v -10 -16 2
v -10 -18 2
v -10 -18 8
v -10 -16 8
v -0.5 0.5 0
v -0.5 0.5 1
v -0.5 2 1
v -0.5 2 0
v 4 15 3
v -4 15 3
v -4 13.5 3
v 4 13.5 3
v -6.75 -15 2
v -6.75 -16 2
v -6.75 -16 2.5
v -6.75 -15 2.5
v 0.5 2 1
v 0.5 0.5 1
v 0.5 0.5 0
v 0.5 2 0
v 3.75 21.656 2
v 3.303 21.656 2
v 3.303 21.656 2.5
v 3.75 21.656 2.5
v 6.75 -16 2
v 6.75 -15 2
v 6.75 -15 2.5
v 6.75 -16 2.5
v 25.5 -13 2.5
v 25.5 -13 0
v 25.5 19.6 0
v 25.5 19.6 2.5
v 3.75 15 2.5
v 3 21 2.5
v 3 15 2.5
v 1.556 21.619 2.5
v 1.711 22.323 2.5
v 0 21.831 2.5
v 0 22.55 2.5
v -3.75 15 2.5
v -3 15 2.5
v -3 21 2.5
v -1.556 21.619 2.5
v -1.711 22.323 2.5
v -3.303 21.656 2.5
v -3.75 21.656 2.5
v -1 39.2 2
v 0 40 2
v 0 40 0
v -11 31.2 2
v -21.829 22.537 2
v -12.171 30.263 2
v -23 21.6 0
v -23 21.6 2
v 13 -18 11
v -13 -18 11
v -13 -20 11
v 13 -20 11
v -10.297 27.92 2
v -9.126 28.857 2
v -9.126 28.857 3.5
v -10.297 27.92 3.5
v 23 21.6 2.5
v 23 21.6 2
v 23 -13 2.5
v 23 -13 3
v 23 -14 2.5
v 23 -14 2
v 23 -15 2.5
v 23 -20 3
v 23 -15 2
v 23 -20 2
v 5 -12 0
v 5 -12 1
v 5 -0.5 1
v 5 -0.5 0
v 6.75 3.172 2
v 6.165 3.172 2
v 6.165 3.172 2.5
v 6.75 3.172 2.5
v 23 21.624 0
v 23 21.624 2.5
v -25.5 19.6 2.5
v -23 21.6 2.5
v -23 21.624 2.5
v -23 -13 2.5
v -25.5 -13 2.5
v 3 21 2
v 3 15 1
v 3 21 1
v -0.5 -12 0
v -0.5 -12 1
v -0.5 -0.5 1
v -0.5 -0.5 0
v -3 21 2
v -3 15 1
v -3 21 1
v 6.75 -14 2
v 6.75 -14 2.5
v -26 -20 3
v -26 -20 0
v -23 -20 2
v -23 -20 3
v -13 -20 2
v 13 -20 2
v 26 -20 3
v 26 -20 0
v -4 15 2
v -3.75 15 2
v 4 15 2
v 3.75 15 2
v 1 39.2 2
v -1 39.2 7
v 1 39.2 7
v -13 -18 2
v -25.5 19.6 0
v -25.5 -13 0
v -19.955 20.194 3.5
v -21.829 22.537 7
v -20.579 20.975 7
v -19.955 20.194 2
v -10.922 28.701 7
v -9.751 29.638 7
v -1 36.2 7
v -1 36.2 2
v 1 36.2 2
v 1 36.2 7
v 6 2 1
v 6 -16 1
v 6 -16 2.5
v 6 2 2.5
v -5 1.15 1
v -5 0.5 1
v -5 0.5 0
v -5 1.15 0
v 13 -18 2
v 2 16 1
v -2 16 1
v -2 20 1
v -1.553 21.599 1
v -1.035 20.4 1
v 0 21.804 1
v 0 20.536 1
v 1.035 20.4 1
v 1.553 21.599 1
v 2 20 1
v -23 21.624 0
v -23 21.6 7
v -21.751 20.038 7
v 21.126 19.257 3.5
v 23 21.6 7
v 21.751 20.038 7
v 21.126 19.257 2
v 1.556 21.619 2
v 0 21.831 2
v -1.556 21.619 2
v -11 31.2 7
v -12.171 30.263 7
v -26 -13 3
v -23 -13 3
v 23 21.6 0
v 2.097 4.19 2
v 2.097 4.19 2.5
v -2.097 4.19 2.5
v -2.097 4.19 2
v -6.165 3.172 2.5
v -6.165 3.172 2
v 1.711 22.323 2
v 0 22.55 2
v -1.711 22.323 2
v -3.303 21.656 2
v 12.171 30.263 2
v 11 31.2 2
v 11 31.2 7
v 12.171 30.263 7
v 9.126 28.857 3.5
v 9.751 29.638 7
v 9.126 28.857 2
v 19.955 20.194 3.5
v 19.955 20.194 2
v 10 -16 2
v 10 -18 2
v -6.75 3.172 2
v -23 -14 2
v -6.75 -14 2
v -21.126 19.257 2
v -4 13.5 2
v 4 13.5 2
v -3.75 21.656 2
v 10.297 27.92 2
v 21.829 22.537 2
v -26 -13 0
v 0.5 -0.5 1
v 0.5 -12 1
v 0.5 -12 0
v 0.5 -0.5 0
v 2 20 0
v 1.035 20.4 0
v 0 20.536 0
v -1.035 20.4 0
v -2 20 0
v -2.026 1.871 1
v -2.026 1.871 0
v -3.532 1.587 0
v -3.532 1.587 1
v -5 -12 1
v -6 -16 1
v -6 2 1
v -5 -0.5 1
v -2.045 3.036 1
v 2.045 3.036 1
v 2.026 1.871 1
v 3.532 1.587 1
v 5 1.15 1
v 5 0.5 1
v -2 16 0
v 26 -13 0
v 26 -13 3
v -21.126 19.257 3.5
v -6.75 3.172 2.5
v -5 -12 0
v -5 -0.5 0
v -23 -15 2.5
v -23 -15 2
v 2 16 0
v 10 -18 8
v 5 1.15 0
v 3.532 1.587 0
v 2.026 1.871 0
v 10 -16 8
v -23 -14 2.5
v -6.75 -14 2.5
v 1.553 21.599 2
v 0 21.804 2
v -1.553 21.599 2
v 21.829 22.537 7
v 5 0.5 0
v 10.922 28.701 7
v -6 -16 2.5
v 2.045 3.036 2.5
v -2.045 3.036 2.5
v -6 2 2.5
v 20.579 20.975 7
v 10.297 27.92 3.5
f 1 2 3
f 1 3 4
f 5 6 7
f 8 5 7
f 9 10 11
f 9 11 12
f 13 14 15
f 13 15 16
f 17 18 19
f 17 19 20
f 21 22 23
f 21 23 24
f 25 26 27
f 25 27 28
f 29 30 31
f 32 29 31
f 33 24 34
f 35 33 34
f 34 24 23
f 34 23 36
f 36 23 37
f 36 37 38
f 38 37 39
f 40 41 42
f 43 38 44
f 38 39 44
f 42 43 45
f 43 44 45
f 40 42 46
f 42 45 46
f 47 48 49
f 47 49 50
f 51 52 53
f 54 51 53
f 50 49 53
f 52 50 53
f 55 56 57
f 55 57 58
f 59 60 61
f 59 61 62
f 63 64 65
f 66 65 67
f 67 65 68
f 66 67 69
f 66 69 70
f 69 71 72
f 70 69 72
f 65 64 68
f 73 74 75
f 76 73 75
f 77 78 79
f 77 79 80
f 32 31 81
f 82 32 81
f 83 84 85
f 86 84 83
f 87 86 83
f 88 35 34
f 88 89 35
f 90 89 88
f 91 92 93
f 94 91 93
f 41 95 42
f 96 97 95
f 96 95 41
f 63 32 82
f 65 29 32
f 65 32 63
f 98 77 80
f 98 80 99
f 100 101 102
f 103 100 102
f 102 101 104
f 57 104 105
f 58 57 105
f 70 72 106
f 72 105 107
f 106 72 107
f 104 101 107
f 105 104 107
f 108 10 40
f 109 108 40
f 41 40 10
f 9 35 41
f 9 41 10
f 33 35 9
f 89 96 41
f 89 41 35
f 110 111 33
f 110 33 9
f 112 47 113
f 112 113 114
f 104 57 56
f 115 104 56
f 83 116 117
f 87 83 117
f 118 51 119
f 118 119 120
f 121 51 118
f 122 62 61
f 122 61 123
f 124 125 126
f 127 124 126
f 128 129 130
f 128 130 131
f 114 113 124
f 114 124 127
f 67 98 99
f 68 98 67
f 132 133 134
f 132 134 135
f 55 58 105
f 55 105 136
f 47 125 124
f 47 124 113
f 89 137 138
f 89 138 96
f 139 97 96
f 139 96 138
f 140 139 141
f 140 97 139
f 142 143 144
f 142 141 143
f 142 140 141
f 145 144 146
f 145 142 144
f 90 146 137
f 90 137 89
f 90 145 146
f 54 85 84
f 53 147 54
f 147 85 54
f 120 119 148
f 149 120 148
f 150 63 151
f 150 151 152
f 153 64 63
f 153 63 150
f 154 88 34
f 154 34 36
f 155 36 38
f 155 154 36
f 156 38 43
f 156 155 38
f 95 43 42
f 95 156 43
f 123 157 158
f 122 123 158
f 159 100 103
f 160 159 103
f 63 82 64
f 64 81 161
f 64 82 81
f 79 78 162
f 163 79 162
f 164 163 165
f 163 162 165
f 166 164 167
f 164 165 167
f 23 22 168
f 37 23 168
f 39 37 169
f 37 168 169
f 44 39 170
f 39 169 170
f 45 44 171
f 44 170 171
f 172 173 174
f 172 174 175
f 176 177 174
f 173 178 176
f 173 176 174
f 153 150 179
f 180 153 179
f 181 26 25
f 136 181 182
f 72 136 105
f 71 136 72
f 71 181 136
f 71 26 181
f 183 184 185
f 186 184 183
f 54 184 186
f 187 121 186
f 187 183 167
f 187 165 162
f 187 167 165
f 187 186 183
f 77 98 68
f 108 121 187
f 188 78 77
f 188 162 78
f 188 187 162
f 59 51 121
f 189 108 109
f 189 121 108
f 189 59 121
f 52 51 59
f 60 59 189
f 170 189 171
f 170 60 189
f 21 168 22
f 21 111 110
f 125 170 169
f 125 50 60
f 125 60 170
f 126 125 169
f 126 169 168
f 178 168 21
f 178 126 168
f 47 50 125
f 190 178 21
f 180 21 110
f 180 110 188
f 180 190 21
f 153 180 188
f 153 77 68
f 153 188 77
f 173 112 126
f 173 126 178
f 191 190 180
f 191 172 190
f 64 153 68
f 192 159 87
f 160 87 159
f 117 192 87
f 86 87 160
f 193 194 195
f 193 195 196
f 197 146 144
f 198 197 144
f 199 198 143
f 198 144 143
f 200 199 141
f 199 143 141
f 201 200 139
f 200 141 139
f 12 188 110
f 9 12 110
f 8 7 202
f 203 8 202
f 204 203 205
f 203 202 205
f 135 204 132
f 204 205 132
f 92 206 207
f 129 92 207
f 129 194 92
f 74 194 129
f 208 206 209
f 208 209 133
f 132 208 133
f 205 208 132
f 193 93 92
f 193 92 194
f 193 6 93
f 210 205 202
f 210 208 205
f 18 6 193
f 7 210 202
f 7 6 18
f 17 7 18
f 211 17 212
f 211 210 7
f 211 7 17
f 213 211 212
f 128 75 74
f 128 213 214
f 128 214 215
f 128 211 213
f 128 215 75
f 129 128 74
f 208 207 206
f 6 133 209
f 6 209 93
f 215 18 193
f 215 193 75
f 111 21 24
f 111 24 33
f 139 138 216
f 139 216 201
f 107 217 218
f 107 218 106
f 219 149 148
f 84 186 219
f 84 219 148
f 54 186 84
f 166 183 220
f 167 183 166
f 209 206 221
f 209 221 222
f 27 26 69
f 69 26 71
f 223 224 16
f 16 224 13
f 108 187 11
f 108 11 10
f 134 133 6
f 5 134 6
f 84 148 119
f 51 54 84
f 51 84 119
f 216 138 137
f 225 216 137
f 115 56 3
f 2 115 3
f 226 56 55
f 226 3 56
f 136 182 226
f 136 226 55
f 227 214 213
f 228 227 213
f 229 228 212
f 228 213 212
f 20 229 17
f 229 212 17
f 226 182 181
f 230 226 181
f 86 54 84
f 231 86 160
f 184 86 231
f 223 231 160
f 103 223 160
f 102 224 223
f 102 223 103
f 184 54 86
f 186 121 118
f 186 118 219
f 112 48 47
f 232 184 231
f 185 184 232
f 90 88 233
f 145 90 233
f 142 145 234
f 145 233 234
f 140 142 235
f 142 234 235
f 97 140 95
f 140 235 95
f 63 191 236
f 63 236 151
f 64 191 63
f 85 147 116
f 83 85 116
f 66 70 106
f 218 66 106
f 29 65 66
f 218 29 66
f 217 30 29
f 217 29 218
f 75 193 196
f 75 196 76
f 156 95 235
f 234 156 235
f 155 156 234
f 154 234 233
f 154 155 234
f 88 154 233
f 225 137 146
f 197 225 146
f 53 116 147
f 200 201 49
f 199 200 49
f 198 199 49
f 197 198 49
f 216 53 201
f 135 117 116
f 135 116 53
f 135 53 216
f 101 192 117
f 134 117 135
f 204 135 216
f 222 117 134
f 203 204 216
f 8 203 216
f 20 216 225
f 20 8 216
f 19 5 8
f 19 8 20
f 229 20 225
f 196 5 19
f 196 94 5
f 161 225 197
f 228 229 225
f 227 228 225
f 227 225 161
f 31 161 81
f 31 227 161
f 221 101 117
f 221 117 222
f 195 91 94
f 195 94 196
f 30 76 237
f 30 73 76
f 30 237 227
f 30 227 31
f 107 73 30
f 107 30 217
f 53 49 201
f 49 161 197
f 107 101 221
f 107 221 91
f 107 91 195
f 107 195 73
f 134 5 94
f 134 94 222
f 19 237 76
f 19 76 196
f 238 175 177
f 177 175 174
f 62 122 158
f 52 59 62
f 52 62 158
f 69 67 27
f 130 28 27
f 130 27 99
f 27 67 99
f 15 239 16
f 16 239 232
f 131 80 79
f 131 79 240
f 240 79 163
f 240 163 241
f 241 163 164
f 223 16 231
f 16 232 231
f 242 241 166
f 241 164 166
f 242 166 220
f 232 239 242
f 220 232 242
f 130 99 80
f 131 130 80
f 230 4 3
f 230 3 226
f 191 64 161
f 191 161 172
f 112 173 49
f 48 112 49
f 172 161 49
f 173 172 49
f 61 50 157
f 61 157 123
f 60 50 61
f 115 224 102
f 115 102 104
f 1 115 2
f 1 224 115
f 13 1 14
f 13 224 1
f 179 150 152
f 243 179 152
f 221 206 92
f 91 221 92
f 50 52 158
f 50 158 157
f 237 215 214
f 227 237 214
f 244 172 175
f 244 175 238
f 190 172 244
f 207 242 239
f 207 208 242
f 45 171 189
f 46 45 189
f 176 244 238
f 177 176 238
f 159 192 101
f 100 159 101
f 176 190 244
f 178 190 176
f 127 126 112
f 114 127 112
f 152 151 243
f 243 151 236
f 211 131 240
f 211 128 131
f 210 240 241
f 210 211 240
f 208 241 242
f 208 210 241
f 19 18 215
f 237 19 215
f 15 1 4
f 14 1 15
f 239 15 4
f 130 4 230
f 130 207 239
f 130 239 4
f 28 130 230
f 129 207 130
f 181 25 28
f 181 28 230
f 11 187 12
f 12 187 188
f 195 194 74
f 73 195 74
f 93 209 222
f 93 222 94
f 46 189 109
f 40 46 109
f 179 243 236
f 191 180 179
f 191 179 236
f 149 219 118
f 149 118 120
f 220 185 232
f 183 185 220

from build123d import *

# Parameters (mm, degrees)
PAD_DEPTH       = 2
POCKET_DEPTH    = 1
SKETCH002_W     = 4.5
SKETCH002_H     = 11.5
POCKET001_DEPTH = 5
SKETCH003_W     = 8
SKETCH003_H     = 1.5
PAD001_DEPTH    = 1
SKETCH004_W     = 26
SKETCH004_H     = 2
PAD002_DEPTH    = 9
SKETCH005_W     = 20
SKETCH005_H     = 2
PAD003_DEPTH    = 6
SKETCH006_W     = 3
SKETCH006_H     = 7
PAD004_DEPTH    = 3
PAD005_DEPTH    = 2.5
SKETCH008_W     = 17
SKETCH008_H     = 1
PAD006_DEPTH    = 0.5
PAD008_DEPTH    = 0.5
SKETCH013_W     = 2.0000000001
SKETCH013_H     = 3
PAD009_DEPTH    = 5
POCKET002_DEPTH = 20
POCKET003_DEPTH = 20


with BuildPart() as part:
    # Sketch → Pad (new body)
    with BuildSketch(Plane.XY):
        Polygon((-25, -20), (25, -20), (25, 20), (0, 40), (-25, 20), align=None)
    extrude(amount=PAD_DEPTH)

    # Sketch001 → Pocket (cut)
    with BuildSketch(Plane.XY.offset(2)):
        with BuildLine():
            Line((-3, 15), (3, 15))
            Line((3, 15), (3, 21))
            ThreePointArc((3, 21), (0, 21.8038475773), (-3, 21))
            Line((-3, 15), (-3, 21))
        make_face()
        with BuildLine():
            Line((-6, -16), (6, -16))
            Line((6, -16), (6, 2))
            ThreePointArc((6, 2), (0, 3.1676030258), (-6, 2))
            Line((-6, -16), (-6, 2))
        make_face()
    extrude(amount=-POCKET_DEPTH, mode=Mode.SUBTRACT)

    # Sketch002 → Pocket001 (cut)
    with BuildSketch(Plane.XY.offset(1)):
        with BuildLine():
            Line((-2, 16), (2, 16))
            Line((2, 16), (2, 20))
            ThreePointArc((2, 20), (0, 20.5358983849), (-2, 20))
            Line((-2, 16), (-2, 20))
        make_face()
        with Locations((-2.75, -6.25)):
            Rectangle(SKETCH002_W, SKETCH002_H)
        with Locations((2.75, -6.25)):
            Rectangle(SKETCH002_W, SKETCH002_H)
        with BuildLine():
            Line((-5, 0.5), (-0.5, 0.5))
            Line((-0.5, 0.5), (-0.5, 2))
            ThreePointArc((-0.5, 2), (-2.7826111414, 1.7479786314), (-5, 1.1504712732))
            Line((-5, 0.5), (-5, 1.1504712732))
        make_face()
        with BuildLine():
            Line((0.5, 0.5), (5, 0.5))
            Line((5, 0.5), (5, 1.1504712732))
            ThreePointArc((5, 1.1504712732), (2.7826111414, 1.7479786314), (0.5, 2))
            Line((0.5, 0.5), (0.5, 2))
        make_face()
    extrude(amount=-POCKET001_DEPTH, mode=Mode.SUBTRACT)

    # Sketch003 → Pad001 (new body)
    with BuildSketch(Plane.XY.offset(2)):
        with Locations((0, 14.25)):
            Rectangle(SKETCH003_W, SKETCH003_H)
    extrude(amount=PAD001_DEPTH)

    # Sketch004 → Pad002 (new body)
    with BuildSketch(Plane.XY.offset(2)):
        with Locations((0, -19)):
            Rectangle(SKETCH004_W, SKETCH004_H)
    extrude(amount=PAD002_DEPTH)

    # Sketch005 → Pad003 (new body)
    with BuildSketch(Plane.XY.offset(2)):
        with Locations((0, -17)):
            Rectangle(SKETCH005_W, SKETCH005_H)
    extrude(amount=PAD003_DEPTH)

    # Sketch006 → Pad004 (new body)
    with BuildSketch(Plane(origin=(0, 0, 0), x_dir=(1, 0, 0), z_dir=(0, 0, -1))):
        with Locations((-24.5, 16.5)):
            Rectangle(SKETCH006_W, SKETCH006_H)
        with Locations((24.5, 16.5)):
            Rectangle(SKETCH006_W, SKETCH006_H)
    extrude(amount=-PAD004_DEPTH)

    # Sketch007 → Pad005 (new body)
    with BuildSketch(Plane(origin=(0, 0, 0), x_dir=(1, 0, 0), z_dir=(0, 0, -1))):
        Polygon((-25.5, 20), (-23, 20), (-23, -21.624460083), (-25.5, -19.6), align=None)
        Polygon((23, 20), (25.5, 20), (25.5, -19.6), (23, -21.624460083), align=None)
    extrude(amount=-PAD005_DEPTH)

    # Sketch008 → Pad006 (new body)
    with BuildSketch(Plane.XY.offset(2)):
        with Locations((-14.5, -14.5)):
            Rectangle(SKETCH008_W, SKETCH008_H)
        with Locations((14.5, -14.5)):
            Rectangle(SKETCH008_W, SKETCH008_H)
    extrude(amount=PAD006_DEPTH)

    # Sketch012 → Pad008 (new body)
    with BuildSketch(Plane.XY.offset(2)):
        with BuildLine():
            ThreePointArc((3, 21), (0, 21.8309518948), (-3, 21))
            Line((-3, 21), (-3, 15))
            Line((-3.75, 15), (-3, 15))
            Line((-3.75, 21.6561501911), (-3.75, 15))
            Line((-3.3030993045, 21.6561501911), (-3.75, 21.6561501911))
            ThreePointArc((3.3030993045, 21.6561501911), (0, 22.55), (-3.3030993046, 21.6561501911))
            Line((3.3030993045, 21.6561501911), (3.75, 21.6561501911))
            Line((3.75, 21.6561501911), (3.75, 15))
            Line((3.75, 15), (3, 15))
            Line((3, 15), (3, 21))
        make_face()
        with BuildLine():
            Line((-6, 2), (-6, -16))
            Line((-6, -16), (-6.75, -16))
            Line((-6.75, -16), (-6.75, 3.1718383847))
            Line((-6.75, 3.1718383847), (-6.1651012574, 3.1718383847))
            ThreePointArc((6.1651012573, 3.1718383847), (0, 4.3182305052), (-6.1651012574, 3.1718383847))
            Line((6.1651012574, 3.1718383847), (6.75, 3.1718383847))
            Line((6.75, 3.1718383847), (6.75, -16))
            Line((6, -16), (6.75, -16))
            Line((6, -16), (6, 2))
            ThreePointArc((6, 2), (0, 3.1676030258), (-6, 2))
        make_face()
    extrude(amount=PAD008_DEPTH)

    # Sketch013 → Pad009 (new body)
    with BuildSketch(Plane.XY.offset(2)):
        with Locations((0, 37.7)):
            Rectangle(SKETCH013_W, SKETCH013_H)
        Polygon((-11, 31.2), (-9.1259148573, 28.8573935717), (-10.2972180715, 27.9203510003), (-12.1713032142, 30.2629574287), align=None)
        Polygon((-21.8286967858, 22.5370425713), (-19.9546116432, 20.194436143), (-21.1259148573, 19.2573935717), (-23, 21.6), align=None)
        Polygon((19.9546116432, 20.194436143), (21.8286967858, 22.5370425713), (23, 21.6), (21.1259148573, 19.2573935717), align=None)
        Polygon((11, 31.2), (12.1713032142, 30.2629574287), (10.2972180715, 27.9203510003), (9.1259148573, 28.8573935717), align=None)
    extrude(amount=PAD009_DEPTH)

    # Sketch014 → Pocket002 (cut)
    with BuildSketch(Plane(origin=(-3.4878048781, -2.7902439024, 0), x_dir=(0.6246950476, -0.7808688094, 0), z_dir=(-0.7808688094, -0.6246950476, 0))):
        Polygon((-29.2347523777, 7), (-28.2347523777, 7), (-28.2347523777, 3.5), align=None)
    extrude(amount=-POCKET002_DEPTH, mode=Mode.SUBTRACT)

    # Sketch015 → Pocket003 (cut)
    with BuildSketch(Plane(origin=(3.4878048781, -2.7902439024, 0), x_dir=(0.6246950476, 0.7808688094, 0), z_dir=(0.7808688094, -0.6246950476, 0))):
        Polygon((28.2347523777, 7), (28.2347523777, 3.5), (29.2347523777, 7), align=None)
    extrude(amount=-POCKET003_DEPTH, mode=Mode.SUBTRACT)


solid = part.part
